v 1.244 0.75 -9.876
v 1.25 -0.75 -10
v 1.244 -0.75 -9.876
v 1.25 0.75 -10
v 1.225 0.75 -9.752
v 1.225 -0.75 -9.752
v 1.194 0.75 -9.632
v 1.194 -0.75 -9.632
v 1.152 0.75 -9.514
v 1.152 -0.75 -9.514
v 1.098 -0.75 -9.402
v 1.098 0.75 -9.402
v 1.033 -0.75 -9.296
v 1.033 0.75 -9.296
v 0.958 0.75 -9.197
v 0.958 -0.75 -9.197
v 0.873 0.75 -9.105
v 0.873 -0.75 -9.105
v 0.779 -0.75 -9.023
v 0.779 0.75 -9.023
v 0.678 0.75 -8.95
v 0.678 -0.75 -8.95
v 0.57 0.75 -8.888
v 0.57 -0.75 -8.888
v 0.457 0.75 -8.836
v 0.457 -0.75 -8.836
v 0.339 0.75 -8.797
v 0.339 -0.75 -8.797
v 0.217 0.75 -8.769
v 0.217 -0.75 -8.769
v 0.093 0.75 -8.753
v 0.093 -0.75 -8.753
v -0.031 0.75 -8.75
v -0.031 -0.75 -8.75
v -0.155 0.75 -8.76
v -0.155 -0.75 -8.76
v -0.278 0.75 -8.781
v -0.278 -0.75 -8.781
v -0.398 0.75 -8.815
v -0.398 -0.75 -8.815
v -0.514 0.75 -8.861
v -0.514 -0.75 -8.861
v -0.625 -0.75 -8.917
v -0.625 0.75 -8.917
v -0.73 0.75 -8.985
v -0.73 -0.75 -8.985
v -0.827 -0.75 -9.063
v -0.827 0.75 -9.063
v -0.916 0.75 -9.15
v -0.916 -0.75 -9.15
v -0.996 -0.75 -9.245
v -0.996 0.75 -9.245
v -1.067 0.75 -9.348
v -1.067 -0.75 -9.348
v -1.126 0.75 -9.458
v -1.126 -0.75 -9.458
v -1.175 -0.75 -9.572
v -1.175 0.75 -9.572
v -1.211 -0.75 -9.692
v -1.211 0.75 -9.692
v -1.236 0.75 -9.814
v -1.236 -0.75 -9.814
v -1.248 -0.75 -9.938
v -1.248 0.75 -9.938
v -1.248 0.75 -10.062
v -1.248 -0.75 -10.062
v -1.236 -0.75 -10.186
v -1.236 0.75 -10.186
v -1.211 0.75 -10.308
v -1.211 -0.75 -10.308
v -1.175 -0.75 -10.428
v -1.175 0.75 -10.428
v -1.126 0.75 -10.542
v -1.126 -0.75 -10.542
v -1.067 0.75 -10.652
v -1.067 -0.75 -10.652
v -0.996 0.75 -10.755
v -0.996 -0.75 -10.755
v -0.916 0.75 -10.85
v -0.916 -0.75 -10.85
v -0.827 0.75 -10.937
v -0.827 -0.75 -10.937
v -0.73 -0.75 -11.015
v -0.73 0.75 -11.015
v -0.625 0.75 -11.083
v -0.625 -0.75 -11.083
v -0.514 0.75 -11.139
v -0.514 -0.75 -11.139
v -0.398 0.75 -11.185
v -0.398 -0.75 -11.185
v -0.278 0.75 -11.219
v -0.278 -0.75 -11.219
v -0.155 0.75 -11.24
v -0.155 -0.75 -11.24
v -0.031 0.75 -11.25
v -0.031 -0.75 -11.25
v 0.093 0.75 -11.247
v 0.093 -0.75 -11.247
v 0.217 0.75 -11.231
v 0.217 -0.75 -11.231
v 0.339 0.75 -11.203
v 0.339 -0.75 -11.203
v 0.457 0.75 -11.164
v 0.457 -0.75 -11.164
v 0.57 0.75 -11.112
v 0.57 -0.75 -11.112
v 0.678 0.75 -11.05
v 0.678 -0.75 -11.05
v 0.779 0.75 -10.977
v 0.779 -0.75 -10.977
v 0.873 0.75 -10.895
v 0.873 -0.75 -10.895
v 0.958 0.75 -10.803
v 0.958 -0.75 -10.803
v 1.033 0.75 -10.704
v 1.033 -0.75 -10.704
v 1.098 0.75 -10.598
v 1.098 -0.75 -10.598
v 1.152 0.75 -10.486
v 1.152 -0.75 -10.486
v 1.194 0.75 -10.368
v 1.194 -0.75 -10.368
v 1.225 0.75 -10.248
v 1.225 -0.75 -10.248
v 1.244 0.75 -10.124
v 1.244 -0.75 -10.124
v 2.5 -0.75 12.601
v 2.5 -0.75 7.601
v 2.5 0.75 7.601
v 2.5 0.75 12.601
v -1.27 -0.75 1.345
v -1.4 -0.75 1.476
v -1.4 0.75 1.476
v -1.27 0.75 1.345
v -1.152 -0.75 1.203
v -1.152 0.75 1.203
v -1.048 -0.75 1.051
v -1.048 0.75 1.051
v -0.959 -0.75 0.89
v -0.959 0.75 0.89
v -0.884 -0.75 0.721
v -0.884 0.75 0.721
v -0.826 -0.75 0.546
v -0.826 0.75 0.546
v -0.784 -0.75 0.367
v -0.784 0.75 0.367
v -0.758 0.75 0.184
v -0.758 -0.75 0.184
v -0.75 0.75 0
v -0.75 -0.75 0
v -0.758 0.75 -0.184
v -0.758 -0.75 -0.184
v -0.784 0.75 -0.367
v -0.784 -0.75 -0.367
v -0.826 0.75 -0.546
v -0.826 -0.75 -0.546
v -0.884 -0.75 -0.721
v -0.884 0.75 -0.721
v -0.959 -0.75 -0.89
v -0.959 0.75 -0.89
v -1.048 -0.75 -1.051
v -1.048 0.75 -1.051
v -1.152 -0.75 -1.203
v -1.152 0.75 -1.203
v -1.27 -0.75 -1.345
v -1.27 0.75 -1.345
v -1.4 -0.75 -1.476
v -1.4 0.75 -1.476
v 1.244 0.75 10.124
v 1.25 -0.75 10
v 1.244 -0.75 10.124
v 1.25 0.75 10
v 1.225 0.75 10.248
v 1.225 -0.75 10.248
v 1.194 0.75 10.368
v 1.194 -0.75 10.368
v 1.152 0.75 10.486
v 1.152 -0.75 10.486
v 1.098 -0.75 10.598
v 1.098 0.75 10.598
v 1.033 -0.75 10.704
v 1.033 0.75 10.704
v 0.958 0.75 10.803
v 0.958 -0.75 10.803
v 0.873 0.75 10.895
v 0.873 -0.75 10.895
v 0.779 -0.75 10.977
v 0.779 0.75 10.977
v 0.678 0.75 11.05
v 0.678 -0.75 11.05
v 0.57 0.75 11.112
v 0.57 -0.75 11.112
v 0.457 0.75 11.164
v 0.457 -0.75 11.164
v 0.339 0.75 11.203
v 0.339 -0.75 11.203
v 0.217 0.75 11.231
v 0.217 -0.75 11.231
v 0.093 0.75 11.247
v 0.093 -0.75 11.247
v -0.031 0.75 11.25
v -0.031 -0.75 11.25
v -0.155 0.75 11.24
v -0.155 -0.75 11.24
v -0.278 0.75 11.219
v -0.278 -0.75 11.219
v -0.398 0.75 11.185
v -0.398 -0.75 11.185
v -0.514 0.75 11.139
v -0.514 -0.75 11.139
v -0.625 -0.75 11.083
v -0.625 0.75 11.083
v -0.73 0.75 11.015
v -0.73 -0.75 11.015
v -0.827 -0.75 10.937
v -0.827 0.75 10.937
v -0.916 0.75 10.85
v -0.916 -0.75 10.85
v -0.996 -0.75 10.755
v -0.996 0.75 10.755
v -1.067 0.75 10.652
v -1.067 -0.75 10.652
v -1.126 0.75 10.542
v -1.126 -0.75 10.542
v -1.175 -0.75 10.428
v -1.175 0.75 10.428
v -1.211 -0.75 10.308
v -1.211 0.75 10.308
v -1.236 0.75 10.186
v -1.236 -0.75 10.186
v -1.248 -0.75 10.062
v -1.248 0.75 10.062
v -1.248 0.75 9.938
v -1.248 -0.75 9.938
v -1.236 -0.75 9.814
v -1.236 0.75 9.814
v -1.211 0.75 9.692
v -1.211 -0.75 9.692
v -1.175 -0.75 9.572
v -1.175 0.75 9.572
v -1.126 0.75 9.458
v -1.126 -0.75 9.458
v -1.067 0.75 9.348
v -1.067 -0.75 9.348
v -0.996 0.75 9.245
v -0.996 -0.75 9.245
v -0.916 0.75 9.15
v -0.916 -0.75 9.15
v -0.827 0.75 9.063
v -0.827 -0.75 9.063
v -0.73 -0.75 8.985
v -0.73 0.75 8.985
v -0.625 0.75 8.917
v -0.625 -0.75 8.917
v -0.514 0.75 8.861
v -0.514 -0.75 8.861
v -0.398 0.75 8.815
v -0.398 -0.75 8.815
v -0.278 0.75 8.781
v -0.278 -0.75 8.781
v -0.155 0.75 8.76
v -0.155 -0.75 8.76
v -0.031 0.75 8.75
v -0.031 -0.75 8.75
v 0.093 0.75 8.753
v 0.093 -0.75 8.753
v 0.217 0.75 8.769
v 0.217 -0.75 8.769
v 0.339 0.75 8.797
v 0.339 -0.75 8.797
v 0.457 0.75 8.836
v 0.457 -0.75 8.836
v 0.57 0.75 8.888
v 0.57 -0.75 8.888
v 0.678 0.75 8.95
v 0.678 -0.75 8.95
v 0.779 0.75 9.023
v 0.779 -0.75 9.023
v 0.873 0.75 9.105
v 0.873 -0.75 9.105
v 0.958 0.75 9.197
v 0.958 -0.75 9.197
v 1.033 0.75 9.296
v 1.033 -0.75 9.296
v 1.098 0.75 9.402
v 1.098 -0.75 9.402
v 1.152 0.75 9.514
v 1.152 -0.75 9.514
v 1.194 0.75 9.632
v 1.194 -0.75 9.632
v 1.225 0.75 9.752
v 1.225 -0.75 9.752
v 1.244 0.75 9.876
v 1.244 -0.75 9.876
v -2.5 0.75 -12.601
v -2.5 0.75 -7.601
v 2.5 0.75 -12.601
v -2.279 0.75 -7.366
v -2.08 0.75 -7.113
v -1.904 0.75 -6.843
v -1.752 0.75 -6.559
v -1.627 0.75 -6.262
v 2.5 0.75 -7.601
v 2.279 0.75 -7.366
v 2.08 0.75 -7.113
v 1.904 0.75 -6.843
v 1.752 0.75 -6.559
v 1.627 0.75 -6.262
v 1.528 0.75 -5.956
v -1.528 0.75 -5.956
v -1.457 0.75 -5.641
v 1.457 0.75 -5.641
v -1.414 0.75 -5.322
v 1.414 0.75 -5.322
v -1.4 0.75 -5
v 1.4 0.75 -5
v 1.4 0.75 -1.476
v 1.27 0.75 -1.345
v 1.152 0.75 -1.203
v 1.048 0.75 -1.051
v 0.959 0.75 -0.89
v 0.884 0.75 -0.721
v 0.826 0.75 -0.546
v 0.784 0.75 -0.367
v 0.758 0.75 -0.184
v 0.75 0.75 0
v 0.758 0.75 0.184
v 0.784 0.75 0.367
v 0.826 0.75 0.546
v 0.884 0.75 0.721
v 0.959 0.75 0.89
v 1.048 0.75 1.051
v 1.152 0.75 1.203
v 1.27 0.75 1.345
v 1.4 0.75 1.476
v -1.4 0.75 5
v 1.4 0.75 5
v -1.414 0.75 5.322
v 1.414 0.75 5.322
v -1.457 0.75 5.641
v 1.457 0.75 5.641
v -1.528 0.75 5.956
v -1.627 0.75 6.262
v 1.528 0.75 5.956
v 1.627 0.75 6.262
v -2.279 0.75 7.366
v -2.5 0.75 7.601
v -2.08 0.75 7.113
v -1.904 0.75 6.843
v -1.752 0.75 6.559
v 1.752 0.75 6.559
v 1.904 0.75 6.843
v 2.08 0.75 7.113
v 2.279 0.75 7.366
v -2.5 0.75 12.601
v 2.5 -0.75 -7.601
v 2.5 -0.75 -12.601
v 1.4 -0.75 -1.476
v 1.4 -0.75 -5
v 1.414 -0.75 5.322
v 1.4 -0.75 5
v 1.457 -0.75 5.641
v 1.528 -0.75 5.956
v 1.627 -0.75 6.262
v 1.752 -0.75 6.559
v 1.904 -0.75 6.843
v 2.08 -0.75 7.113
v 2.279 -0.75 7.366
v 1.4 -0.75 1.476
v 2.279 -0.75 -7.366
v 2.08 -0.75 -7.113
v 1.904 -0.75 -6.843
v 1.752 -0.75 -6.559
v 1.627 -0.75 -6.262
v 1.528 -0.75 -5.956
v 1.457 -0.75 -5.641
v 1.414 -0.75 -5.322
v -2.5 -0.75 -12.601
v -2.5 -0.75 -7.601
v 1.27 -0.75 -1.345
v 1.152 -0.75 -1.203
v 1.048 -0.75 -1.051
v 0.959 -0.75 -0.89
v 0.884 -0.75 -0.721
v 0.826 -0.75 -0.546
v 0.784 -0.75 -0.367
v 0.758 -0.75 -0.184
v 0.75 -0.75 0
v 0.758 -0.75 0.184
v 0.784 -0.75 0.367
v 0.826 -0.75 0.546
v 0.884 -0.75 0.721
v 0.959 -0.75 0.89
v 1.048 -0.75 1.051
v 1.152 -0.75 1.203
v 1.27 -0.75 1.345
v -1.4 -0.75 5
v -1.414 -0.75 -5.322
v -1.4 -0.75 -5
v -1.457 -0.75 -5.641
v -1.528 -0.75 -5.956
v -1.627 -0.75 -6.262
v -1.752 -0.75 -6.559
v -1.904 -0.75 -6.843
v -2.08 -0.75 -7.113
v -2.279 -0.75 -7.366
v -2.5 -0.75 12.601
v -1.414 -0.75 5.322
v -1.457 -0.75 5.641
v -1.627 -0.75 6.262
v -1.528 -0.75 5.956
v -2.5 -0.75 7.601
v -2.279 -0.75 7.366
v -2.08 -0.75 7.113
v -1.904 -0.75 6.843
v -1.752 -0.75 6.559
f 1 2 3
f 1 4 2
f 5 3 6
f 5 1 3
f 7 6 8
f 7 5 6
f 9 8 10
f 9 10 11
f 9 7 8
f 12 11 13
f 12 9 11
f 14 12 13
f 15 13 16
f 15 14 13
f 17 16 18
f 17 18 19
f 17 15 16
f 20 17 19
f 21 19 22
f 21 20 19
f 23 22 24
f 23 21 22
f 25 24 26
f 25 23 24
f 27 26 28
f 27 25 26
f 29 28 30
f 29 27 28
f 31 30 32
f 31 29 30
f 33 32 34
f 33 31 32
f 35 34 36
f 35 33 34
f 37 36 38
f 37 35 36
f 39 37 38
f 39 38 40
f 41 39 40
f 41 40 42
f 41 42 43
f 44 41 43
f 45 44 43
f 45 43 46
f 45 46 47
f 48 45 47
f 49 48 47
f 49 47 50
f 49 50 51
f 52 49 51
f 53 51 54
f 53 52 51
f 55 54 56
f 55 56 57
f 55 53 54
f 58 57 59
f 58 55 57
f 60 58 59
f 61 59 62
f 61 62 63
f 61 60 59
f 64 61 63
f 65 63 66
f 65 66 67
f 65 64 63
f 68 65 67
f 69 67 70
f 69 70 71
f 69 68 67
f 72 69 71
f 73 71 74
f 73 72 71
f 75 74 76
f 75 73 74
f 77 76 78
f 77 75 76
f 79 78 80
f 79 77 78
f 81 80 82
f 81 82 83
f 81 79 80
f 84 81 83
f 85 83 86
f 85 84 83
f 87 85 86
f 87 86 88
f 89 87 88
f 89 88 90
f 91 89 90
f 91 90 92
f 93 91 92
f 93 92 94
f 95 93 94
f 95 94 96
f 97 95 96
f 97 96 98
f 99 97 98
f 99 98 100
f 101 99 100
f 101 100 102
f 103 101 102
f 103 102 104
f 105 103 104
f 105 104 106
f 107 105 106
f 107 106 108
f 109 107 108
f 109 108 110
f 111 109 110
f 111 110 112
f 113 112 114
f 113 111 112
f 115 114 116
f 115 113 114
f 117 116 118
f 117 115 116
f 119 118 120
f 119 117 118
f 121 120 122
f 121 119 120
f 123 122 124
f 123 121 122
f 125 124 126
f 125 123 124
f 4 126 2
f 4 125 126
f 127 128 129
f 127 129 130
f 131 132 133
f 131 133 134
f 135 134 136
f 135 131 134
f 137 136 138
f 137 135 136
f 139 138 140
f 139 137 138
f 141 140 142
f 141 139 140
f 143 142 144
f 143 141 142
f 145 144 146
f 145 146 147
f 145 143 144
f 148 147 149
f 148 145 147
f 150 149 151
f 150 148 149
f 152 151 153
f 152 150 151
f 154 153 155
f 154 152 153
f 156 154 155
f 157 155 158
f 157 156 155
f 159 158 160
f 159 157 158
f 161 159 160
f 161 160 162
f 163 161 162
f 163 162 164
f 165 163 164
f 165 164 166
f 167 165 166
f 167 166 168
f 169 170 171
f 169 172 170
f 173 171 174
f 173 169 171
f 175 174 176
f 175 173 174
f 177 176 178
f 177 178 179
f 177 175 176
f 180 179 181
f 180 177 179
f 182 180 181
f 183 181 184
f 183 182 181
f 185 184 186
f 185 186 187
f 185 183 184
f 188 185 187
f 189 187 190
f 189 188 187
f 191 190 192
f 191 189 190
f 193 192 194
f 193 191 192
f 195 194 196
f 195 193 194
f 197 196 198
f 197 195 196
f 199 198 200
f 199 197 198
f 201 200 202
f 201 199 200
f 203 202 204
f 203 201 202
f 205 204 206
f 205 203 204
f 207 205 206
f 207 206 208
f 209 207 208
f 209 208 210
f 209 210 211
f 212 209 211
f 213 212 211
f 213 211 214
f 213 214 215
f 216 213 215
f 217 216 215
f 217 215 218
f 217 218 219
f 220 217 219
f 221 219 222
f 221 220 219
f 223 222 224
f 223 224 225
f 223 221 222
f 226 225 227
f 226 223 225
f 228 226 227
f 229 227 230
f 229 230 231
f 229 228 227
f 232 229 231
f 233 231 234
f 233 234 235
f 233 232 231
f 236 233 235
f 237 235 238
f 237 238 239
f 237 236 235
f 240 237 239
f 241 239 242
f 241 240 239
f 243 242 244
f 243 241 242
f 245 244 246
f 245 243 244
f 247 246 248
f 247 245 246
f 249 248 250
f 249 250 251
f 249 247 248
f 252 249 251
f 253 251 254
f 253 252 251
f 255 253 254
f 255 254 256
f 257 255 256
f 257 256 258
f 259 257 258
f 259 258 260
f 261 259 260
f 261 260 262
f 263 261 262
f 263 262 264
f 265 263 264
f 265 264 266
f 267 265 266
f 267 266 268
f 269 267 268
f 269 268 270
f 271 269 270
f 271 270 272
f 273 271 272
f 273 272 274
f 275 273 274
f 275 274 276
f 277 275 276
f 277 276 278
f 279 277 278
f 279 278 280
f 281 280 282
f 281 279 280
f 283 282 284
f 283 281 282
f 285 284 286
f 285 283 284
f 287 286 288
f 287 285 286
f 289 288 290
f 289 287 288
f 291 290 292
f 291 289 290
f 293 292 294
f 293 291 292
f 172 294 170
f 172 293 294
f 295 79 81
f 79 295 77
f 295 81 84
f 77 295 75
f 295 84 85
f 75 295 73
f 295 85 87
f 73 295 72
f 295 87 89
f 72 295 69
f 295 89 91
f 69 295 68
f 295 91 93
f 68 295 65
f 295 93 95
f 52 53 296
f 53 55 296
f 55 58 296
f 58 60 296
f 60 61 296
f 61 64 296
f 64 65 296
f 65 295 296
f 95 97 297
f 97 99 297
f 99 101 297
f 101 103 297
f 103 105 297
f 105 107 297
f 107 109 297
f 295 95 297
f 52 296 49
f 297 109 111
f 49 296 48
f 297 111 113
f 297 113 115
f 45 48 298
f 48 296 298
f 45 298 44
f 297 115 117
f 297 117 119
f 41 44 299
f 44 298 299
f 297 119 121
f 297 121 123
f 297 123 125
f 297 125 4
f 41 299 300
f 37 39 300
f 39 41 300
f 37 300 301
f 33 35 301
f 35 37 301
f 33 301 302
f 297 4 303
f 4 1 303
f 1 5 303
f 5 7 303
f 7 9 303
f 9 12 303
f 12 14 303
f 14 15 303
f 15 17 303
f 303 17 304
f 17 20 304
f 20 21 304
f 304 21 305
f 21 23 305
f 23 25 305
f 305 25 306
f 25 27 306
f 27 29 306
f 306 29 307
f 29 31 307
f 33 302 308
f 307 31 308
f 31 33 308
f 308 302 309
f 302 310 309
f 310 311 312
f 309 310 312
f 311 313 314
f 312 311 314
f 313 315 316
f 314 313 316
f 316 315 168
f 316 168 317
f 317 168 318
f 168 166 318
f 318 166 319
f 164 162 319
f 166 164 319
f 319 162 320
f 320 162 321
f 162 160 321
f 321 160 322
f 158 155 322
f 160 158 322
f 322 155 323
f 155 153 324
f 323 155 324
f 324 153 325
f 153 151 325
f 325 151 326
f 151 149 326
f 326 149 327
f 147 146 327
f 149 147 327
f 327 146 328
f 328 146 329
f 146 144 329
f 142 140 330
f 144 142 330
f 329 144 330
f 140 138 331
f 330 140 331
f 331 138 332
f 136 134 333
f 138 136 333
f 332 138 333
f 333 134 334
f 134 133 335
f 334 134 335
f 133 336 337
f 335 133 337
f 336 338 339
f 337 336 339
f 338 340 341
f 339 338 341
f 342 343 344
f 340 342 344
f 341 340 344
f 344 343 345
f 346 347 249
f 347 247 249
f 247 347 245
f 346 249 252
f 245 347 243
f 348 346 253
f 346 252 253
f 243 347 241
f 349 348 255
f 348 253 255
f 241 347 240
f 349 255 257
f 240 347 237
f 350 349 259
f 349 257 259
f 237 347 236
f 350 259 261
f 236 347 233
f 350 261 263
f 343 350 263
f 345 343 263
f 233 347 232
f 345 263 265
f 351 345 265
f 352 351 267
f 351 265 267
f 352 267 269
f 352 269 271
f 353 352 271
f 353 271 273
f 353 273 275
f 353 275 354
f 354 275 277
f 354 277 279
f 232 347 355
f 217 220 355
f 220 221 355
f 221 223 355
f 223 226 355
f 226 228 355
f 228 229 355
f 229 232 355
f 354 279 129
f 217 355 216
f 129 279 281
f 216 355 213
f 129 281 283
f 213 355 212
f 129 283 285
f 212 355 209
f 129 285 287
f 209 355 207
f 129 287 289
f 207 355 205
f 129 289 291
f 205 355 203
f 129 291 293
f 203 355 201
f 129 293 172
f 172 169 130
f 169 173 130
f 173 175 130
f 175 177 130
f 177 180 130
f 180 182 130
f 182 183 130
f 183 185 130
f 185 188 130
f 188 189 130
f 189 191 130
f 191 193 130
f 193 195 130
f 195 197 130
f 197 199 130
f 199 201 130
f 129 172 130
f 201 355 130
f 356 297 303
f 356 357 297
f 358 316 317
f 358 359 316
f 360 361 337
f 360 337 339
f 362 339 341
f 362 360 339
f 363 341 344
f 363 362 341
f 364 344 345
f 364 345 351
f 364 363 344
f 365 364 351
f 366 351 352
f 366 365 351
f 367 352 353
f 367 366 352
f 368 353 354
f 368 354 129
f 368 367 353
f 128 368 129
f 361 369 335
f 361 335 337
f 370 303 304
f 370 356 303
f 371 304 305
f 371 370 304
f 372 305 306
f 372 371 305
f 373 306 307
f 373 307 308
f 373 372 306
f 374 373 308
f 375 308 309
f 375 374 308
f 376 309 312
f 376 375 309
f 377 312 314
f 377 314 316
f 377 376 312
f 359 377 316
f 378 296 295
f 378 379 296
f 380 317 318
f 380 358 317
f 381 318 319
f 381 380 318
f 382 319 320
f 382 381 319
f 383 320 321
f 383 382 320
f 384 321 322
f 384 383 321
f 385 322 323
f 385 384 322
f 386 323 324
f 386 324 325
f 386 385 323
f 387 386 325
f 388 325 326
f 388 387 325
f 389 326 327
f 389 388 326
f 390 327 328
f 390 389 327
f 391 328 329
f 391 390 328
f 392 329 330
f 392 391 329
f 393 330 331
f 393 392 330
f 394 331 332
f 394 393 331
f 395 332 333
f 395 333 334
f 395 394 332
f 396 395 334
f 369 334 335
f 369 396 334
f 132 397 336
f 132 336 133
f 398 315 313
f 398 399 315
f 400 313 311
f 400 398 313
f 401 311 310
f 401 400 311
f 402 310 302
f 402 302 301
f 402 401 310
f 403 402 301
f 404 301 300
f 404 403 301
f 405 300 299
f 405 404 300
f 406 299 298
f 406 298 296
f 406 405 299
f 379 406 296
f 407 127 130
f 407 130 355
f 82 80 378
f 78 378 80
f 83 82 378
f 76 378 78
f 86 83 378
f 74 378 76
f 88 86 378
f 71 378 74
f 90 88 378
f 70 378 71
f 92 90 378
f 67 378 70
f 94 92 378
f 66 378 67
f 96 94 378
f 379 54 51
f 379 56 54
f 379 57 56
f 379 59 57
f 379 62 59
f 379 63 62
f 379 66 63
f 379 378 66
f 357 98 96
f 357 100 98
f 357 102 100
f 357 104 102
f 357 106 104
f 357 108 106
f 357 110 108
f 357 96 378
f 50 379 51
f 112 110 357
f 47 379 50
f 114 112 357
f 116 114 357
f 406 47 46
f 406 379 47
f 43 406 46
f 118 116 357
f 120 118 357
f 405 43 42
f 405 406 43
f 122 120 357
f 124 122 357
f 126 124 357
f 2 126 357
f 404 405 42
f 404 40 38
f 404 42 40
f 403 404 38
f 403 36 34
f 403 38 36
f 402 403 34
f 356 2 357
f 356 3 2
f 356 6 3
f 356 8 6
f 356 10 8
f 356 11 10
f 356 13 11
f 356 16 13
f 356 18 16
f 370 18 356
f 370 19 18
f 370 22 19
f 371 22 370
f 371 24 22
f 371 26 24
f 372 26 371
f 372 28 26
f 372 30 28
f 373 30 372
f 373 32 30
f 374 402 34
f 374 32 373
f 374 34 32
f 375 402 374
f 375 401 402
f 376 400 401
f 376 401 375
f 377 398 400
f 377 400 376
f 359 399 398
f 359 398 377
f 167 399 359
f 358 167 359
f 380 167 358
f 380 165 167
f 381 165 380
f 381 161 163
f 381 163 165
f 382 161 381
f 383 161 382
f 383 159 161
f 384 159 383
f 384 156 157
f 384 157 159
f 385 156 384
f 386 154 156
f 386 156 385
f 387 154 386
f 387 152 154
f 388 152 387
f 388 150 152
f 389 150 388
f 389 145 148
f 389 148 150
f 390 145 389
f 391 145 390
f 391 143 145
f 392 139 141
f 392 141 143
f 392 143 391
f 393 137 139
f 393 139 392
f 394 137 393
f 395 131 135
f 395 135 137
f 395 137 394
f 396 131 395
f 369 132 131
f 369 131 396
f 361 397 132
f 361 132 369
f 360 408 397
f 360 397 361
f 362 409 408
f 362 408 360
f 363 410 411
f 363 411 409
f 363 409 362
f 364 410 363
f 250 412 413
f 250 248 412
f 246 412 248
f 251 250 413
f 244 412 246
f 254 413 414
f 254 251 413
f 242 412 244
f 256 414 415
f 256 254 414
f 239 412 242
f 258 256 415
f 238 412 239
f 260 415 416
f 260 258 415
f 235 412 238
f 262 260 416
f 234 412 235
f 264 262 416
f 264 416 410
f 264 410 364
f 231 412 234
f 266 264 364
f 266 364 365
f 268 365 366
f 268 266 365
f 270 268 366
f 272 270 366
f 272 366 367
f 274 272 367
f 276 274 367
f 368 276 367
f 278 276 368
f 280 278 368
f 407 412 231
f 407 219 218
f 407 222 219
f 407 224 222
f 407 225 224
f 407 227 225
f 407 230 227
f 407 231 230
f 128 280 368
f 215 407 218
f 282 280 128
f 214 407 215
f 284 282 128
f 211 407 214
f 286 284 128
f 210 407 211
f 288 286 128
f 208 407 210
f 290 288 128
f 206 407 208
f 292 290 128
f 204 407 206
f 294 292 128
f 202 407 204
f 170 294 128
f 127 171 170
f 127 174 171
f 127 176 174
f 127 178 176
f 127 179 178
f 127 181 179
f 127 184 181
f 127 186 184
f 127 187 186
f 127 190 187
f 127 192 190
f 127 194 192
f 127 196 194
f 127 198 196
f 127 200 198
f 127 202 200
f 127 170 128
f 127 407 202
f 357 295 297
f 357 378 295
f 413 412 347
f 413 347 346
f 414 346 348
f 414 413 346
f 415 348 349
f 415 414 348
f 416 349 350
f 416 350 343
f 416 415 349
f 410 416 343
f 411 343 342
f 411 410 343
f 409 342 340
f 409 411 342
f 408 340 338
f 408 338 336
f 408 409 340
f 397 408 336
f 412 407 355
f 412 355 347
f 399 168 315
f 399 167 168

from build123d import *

# Parameters (mm, degrees)
F1_R     = 1.25
F2_DEPTH = 0.75


with BuildPart() as f2:
    # F1 (on Front) → F2 (new body, symmetric)
    with BuildSketch(Plane.XZ):
        with BuildLine():
            ThreePointArc((0.75, 0), (0.9196994782, 0.8062257748), (1.4, 1.4756354563))
            Line((1.4, 1.4756354563), (1.4, 5))
            ThreePointArc((1.4, 5), (1.6863063932, 6.4120021246), (2.5, 7.6009613607))
            Line((2.5, 7.6009613607), (2.5, 12.6009613607))
            Line((2.5, 12.6009613607), (0, 12.6009613607))
            Line((0, 12.6009613607), (-2.5, 12.6009613607))
            Line((-2.5, 12.6009613607), (-2.5, 7.6009613607))
            ThreePointArc((-2.5, 7.6009613607), (-1.6863063932, 6.4120021246), (-1.4, 5))
            Line((-1.4, 5), (-1.4, 1.4756354563))
            ThreePointArc((-1.4, 1.4756354563), (-0.9196994782, 0.8062257748), (-0.75, 0))
            ThreePointArc((-0.75, 0), (-0.9196994782, -0.8062257748), (-1.4, -1.4756354563))
            Line((-1.4, -1.4756354563), (-1.4, -5))
            ThreePointArc((-1.4, -5), (-1.6863063932, -6.4120021246), (-2.5, -7.6009613607))
            Line((-2.5, -7.6009613607), (-2.5, -12.6009613607))
            Line((-2.5, -12.6009613607), (0, -12.6009613607))
            Line((0, -12.6009613607), (2.5, -12.6009613607))
            Line((2.5, -12.6009613607), (2.5, -7.6009613607))
            ThreePointArc((2.5, -7.6009613607), (1.6863063932, -6.4120021246), (1.4, -5))
            Line((1.4, -5), (1.4, -1.4756354563))
            ThreePointArc((1.4, -1.4756354563), (0.9196994782, -0.8062257748), (0.75, 0))
        make_face()
        with Locations((0, -10)):
            Circle(F1_R, mode=Mode.SUBTRACT)
        with Locations((0, 10)):
            Circle(F1_R, mode=Mode.SUBTRACT)
    extrude(amount=F2_DEPTH, both=True)


solid = f2.part
